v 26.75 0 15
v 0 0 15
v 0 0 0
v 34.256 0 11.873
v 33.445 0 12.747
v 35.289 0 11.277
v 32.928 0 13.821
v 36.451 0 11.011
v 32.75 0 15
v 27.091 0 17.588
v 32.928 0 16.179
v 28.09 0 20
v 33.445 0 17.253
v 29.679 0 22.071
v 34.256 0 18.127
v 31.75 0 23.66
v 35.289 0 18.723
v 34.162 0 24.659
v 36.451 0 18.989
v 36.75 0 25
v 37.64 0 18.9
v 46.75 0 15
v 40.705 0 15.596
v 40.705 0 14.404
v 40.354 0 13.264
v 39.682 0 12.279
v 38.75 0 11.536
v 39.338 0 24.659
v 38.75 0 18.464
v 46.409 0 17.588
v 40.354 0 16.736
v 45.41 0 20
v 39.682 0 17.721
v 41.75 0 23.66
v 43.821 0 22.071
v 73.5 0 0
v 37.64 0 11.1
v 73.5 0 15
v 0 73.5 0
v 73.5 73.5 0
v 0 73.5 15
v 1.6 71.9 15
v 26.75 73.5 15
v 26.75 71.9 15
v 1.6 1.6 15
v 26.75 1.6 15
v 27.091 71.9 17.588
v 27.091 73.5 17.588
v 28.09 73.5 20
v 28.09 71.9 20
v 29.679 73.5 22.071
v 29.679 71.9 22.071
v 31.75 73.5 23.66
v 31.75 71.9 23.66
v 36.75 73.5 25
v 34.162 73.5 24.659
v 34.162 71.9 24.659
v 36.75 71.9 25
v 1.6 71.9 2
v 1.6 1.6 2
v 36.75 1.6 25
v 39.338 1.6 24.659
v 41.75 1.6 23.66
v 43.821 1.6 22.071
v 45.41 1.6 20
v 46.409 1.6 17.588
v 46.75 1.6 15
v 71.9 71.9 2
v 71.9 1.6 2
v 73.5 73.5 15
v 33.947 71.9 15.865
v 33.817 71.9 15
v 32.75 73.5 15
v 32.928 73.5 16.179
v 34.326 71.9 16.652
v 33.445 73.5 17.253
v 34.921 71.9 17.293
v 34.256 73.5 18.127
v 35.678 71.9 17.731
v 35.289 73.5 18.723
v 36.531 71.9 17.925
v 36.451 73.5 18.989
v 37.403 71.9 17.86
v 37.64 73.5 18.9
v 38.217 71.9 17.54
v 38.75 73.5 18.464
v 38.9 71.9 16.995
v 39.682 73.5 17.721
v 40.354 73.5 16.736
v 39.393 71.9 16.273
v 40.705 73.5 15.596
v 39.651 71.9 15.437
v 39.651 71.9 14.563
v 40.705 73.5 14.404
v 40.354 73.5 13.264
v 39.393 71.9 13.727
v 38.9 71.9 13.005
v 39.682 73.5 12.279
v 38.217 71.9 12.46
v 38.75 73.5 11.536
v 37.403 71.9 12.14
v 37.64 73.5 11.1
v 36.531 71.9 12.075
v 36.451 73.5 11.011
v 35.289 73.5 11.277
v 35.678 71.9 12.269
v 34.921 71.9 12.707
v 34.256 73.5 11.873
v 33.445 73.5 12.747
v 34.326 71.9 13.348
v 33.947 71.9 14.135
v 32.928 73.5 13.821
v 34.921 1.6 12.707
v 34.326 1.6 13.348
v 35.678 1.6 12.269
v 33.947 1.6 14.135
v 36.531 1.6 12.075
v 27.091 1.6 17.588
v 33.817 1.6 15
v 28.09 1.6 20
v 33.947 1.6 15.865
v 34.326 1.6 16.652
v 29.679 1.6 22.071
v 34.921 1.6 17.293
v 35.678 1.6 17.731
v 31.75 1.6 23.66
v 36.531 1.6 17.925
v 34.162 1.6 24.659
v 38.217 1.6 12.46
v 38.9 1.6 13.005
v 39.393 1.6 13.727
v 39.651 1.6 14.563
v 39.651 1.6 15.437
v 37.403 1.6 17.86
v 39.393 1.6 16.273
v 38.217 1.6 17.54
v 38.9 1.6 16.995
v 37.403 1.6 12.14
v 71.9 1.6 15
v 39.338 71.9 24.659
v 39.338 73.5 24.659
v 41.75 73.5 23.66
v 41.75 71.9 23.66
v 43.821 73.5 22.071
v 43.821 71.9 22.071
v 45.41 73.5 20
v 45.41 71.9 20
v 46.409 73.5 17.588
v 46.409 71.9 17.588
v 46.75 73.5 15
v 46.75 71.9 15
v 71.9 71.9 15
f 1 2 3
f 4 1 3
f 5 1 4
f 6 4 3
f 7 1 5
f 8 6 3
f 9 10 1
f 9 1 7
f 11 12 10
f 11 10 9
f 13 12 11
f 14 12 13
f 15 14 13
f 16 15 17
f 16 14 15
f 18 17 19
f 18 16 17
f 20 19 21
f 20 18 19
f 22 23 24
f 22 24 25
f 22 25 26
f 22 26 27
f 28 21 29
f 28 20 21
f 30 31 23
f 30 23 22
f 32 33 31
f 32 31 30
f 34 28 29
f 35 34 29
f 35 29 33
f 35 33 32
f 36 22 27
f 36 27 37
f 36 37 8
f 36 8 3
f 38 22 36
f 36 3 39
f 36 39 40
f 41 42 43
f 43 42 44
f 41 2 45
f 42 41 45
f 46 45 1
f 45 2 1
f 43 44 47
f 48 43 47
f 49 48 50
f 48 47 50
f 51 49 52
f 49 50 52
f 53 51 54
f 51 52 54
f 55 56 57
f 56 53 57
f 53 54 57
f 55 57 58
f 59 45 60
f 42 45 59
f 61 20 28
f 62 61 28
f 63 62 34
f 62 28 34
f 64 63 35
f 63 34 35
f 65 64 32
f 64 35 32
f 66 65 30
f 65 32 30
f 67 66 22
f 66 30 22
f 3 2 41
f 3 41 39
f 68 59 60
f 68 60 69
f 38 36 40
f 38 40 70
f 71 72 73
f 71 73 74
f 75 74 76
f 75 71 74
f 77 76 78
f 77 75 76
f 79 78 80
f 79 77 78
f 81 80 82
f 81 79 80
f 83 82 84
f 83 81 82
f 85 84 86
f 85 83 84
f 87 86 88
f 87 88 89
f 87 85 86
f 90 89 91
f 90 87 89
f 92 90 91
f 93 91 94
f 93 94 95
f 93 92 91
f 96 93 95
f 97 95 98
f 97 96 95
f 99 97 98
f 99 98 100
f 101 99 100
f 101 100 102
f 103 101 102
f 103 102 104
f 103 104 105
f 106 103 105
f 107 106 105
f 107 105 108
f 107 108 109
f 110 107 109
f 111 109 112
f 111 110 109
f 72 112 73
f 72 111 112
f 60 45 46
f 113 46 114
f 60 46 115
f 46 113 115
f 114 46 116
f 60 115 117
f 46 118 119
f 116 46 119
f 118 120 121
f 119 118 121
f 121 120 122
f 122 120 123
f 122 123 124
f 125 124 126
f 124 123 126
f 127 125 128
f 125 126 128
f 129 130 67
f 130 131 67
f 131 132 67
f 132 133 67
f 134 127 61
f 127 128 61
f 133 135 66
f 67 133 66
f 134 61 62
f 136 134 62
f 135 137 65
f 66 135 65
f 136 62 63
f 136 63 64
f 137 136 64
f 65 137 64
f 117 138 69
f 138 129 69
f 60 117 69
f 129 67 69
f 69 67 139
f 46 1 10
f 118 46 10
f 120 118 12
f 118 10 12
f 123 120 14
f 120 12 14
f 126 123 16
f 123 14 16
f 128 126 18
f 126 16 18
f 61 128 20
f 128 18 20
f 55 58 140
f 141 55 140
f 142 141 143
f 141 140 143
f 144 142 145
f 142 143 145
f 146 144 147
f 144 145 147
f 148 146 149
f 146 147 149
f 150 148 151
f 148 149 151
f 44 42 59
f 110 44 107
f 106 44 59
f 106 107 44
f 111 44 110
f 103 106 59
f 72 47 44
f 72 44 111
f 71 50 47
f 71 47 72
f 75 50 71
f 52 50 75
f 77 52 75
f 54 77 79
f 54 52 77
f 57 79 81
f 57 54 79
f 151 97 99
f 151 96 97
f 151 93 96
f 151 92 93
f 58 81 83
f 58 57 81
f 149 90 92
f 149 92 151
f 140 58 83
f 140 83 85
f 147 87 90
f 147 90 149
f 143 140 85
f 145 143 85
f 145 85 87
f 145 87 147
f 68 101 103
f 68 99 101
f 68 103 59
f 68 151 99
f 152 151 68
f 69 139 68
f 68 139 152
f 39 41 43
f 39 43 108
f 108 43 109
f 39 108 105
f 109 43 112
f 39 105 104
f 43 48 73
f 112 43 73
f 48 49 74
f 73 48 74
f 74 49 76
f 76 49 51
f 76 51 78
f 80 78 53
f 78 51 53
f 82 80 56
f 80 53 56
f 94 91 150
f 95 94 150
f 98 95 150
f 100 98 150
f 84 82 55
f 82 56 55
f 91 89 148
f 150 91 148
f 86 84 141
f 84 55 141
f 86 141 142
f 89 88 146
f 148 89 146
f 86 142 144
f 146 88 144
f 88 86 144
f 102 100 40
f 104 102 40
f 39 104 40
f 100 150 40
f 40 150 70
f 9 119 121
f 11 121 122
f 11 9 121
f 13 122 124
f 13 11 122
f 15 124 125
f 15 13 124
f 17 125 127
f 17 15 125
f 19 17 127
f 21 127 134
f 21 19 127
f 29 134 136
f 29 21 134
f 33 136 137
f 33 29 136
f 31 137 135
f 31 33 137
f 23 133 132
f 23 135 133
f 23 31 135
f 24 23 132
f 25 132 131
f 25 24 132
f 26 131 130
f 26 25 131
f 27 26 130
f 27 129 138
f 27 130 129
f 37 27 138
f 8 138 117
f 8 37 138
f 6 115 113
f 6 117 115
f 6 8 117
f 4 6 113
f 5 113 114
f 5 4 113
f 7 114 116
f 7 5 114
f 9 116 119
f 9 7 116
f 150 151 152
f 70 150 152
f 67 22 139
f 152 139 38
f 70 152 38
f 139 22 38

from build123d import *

# Parameters (mm, degrees)
F1_DEPTH = 73.5
F2_W     = 70.3
F2_H     = 70.3
F3_DEPTH = 23
F4_DEPTH = 73.501


# Not quite as in the source:
# - a fillet or chamfer that OpenCascade refuses, or shapes differently, is made with other operations: its cross-section is extruded or revolved along the edge and cut away or added


with BuildPart() as f1:
    # F0 (on Front) → F1 (new body)
    with BuildSketch(Plane.XZ):
        with BuildLine():
            Line((0, 15), (0, 0))
            Line((0, 0), (73.5, 0))
            Line((73.5, 0), (73.5, 15))
            Line((73.5, 15), (46.75, 15))
            Line((46.75, 15), (38.75, 15))
            ThreePointArc((38.75, 15), (36.75, 13), (34.75, 15))
            Line((34.75, 15), (26.75, 15))
            Line((26.75, 15), (0, 15))
        make_face()
        with BuildLine():
            Line((0, 25), (0, 15))
            Line((0, 15), (26.75, 15))
            ThreePointArc((26.75, 15), (29.6789321881, 22.0710678119), (36.75, 25))
            Line((36.75, 25), (0, 25))
        make_face()
        with BuildLine():
            Line((46.75, 15), (73.5, 15))
            Line((73.5, 15), (73.5, 25))
            Line((73.5, 25), (36.75, 25))
            ThreePointArc((36.75, 25), (43.8210678119, 22.0710678119), (46.75, 15))
        make_face()
        with BuildLine():
            ThreePointArc((36.75, 25), (29.6789321881, 22.0710678119), (26.75, 15))
            Line((26.75, 15), (34.75, 15))
            ThreePointArc((34.75, 15), (36.75, 17), (38.75, 15))
            Line((38.75, 15), (46.75, 15))
            ThreePointArc((46.75, 15), (43.8210678119, 22.0710678119), (36.75, 25))
        make_face()
    extrude(amount=-F1_DEPTH)

    # F2 (on face) → F3 (cut)
    with BuildSketch(Plane.XY.offset(25)):
        with Locations((36.75, 36.75)):
            Rectangle(F2_W, F2_H)
    extrude(amount=-F3_DEPTH, mode=Mode.SUBTRACT)

    # F0 (on Front) → F4 (cut, through all)
    with BuildSketch(Plane.XZ):
        with BuildLine():
            Line((0, 25), (0, 15))
            Line((0, 15), (26.75, 15))
            ThreePointArc((26.75, 15), (29.6789321881, 22.0710678119), (36.75, 25))
            Line((36.75, 25), (0, 25))
        make_face()
        with BuildLine():
            Line((46.75, 15), (73.5, 15))
            Line((73.5, 15), (73.5, 25))
            Line((73.5, 25), (36.75, 25))
            ThreePointArc((36.75, 25), (43.8210678119, 22.0710678119), (46.75, 15))
        make_face()
    extrude(amount=-F4_DEPTH, mode=Mode.SUBTRACT)

    # F5: chamfer of 3 x 2 on 1 edges, made by hand

    # F5_s1 → F5_t2 (revolve, cut)
    with BuildSketch(Plane.XY.offset(15)):
        Polygon((34.75, 3), (32.75, 0), (34.75, 0), align=None)
    revolve(axis=Axis((36.75, 0, 15), (0, 1, 0)), mode=Mode.SUBTRACT)

    # F6: chamfer of 3 x 2 on 1 edges, made by hand

    # F6_s1 → F6_t2 (revolve, cut)
    with BuildSketch(Plane.XY.offset(15)):
        Polygon((32.75, 73.5), (34.75, 70.5), (34.75, 73.5), align=None)
    revolve(axis=Axis((36.75, 73.5, 15), (0, 1, 0)), mode=Mode.SUBTRACT)


solid = f1.part
